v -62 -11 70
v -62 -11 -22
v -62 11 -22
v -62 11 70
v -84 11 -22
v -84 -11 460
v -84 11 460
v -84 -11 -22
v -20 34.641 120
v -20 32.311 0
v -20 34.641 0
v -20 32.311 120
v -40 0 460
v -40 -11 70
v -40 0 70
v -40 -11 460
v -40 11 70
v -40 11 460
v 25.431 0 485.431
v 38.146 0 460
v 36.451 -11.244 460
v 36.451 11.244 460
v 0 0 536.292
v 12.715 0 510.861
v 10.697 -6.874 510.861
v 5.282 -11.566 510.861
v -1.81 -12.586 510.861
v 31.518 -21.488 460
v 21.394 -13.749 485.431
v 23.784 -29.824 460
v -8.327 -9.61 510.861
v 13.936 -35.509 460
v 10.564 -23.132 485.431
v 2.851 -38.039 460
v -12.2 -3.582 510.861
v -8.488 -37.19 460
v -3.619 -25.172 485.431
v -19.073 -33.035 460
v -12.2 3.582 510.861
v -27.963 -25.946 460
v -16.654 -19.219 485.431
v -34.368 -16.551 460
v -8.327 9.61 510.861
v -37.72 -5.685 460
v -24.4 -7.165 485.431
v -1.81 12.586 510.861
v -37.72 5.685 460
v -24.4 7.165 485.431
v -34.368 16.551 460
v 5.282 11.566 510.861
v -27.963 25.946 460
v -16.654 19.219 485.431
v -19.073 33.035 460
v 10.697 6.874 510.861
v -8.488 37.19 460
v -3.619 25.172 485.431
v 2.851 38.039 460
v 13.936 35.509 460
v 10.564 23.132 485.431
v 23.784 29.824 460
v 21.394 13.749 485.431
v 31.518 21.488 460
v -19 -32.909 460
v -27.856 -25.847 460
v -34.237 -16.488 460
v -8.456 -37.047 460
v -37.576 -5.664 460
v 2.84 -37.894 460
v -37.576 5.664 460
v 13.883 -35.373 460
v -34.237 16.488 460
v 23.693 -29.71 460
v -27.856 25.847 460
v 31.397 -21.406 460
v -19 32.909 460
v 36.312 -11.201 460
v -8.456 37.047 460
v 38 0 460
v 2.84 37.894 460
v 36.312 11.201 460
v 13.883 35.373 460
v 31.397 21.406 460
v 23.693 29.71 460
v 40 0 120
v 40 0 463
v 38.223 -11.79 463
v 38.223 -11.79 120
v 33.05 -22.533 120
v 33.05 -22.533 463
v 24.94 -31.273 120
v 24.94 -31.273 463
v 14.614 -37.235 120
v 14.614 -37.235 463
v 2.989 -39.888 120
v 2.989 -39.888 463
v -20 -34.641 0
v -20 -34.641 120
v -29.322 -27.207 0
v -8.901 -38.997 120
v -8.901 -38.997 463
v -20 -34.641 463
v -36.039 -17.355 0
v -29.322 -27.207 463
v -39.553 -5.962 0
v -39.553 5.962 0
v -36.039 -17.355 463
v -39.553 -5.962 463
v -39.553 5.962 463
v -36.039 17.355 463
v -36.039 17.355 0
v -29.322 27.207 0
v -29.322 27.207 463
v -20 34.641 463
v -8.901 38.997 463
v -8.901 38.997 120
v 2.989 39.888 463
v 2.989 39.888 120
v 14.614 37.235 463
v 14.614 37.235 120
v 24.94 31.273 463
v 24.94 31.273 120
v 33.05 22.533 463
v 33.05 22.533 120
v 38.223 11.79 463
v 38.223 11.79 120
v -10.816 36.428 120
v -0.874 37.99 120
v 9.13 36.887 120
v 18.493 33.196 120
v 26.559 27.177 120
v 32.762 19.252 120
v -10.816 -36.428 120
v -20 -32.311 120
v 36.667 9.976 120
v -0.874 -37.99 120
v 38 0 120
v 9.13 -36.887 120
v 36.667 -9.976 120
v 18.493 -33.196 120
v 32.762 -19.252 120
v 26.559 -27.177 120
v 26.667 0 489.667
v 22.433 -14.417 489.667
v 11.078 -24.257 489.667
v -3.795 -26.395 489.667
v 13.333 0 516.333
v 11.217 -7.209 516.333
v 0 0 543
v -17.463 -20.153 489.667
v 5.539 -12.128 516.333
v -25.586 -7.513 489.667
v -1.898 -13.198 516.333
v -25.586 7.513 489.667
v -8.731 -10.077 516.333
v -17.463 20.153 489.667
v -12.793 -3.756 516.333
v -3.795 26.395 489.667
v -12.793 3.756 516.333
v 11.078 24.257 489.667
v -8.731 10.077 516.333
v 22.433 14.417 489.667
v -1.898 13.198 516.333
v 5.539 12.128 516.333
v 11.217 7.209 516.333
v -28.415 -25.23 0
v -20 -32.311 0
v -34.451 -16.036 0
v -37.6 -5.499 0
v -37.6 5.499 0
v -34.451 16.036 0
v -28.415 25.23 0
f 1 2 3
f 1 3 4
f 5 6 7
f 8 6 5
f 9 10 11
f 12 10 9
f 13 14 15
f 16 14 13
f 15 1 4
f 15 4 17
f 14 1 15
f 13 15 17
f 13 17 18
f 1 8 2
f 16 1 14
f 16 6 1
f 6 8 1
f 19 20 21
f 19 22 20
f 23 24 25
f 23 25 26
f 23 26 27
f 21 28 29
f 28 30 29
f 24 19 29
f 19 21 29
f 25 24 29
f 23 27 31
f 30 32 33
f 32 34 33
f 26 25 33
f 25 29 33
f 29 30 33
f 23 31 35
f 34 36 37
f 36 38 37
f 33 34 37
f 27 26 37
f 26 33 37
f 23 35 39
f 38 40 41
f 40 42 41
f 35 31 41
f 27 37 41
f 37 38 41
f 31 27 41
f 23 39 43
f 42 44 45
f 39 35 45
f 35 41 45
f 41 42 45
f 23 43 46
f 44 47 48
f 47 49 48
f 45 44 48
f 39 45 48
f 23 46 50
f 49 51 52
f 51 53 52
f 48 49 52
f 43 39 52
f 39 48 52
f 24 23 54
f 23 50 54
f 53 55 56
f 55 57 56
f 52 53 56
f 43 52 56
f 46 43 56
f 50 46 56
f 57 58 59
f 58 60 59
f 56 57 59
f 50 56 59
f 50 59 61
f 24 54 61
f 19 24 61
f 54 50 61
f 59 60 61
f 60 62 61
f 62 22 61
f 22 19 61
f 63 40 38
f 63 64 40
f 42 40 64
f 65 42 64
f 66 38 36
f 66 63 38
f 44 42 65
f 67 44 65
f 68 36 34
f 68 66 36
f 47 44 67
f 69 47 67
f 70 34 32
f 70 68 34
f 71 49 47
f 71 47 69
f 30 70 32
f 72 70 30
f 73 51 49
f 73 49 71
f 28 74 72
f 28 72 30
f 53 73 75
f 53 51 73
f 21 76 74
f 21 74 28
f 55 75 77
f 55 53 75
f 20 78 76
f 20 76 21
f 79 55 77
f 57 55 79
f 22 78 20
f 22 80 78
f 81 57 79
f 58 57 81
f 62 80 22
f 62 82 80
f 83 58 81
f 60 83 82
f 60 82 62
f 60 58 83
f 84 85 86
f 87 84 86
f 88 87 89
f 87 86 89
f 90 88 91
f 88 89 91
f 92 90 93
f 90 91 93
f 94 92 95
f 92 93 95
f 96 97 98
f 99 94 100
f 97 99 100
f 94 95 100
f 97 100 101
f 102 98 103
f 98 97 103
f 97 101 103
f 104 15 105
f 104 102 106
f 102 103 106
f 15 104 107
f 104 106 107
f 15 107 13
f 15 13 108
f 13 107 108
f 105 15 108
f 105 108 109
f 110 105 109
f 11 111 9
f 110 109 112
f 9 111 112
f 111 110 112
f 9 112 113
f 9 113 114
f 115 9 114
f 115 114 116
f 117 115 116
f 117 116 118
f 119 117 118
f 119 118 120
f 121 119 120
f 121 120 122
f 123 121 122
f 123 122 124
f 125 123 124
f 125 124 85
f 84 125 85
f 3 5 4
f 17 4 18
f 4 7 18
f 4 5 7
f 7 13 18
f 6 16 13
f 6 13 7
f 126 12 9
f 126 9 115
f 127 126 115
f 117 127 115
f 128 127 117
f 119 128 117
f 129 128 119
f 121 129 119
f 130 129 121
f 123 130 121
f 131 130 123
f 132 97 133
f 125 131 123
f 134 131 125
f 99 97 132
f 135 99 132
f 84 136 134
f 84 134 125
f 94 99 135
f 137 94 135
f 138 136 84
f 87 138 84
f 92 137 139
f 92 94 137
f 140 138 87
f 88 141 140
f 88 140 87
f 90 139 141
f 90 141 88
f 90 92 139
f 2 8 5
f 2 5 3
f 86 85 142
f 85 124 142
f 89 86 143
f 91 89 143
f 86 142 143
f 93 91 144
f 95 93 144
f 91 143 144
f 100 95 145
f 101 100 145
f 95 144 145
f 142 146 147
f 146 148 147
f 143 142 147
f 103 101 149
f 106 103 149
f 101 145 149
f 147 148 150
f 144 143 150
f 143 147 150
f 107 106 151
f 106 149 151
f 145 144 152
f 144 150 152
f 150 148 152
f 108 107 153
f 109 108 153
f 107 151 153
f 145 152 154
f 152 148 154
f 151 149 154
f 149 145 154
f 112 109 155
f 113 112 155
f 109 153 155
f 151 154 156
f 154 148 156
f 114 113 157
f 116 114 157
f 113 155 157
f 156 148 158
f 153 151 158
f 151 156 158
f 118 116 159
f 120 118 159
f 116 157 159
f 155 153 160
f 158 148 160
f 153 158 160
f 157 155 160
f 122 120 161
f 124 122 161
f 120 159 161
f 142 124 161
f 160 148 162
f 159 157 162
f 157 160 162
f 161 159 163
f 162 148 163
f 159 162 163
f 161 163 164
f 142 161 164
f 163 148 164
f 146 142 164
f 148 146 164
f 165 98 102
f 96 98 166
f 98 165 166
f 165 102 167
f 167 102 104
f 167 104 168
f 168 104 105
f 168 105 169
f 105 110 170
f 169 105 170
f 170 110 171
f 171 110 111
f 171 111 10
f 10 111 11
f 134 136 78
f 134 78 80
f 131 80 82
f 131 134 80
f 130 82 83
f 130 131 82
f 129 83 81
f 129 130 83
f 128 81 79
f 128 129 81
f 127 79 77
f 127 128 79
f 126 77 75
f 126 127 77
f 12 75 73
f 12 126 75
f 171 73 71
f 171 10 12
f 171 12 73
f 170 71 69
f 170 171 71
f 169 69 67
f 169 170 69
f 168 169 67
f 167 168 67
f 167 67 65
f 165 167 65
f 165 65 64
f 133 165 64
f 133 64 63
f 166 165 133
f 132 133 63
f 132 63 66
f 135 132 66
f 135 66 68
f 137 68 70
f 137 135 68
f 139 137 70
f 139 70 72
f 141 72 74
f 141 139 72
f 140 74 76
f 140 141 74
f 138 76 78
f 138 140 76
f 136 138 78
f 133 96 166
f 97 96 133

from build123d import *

# Parameters (mm, degrees)
F0_R     = 40
F0_R_2   = 38
F1_DEPTH = 460
F2_W     = 60
F2_H     = 120
F3_DEPTH = 45
F7_DEPTH = 11


with BuildPart() as f1:
    # F0 (on Top) → F1 (new body)
    with BuildSketch(Plane.XY):
        Circle(F0_R)
        Circle(F0_R_2, mode=Mode.SUBTRACT)
    extrude(amount=F1_DEPTH)

    # F2 (on Front) → F3 (cut, symmetric)
    with BuildSketch(Plane.XZ):
        with Locations((10, 60)):
            Rectangle(F2_W, F2_H)
    extrude(amount=F3_DEPTH, both=True, mode=Mode.SUBTRACT)

    # F4 (on Front) → F5 (revolve)
    with BuildSketch(Plane.XZ):
        Polygon((40, 463), (0, 543), (0, 536.291796), (38.145898, 460), (40, 460), align=None)
    revolve(axis=Axis((0, 0, 539.645898), (0, 0, -1)))

    # F6 (on Front) → F7 (join, symmetric)
    with BuildSketch(Plane.XZ):
        Polygon((-84, 460), (-84, -22), (-62, -22), (-62, 70), (-40, 70), (-40, 460), align=None)
    extrude(amount=F7_DEPTH, both=True)


solid = f1.part
